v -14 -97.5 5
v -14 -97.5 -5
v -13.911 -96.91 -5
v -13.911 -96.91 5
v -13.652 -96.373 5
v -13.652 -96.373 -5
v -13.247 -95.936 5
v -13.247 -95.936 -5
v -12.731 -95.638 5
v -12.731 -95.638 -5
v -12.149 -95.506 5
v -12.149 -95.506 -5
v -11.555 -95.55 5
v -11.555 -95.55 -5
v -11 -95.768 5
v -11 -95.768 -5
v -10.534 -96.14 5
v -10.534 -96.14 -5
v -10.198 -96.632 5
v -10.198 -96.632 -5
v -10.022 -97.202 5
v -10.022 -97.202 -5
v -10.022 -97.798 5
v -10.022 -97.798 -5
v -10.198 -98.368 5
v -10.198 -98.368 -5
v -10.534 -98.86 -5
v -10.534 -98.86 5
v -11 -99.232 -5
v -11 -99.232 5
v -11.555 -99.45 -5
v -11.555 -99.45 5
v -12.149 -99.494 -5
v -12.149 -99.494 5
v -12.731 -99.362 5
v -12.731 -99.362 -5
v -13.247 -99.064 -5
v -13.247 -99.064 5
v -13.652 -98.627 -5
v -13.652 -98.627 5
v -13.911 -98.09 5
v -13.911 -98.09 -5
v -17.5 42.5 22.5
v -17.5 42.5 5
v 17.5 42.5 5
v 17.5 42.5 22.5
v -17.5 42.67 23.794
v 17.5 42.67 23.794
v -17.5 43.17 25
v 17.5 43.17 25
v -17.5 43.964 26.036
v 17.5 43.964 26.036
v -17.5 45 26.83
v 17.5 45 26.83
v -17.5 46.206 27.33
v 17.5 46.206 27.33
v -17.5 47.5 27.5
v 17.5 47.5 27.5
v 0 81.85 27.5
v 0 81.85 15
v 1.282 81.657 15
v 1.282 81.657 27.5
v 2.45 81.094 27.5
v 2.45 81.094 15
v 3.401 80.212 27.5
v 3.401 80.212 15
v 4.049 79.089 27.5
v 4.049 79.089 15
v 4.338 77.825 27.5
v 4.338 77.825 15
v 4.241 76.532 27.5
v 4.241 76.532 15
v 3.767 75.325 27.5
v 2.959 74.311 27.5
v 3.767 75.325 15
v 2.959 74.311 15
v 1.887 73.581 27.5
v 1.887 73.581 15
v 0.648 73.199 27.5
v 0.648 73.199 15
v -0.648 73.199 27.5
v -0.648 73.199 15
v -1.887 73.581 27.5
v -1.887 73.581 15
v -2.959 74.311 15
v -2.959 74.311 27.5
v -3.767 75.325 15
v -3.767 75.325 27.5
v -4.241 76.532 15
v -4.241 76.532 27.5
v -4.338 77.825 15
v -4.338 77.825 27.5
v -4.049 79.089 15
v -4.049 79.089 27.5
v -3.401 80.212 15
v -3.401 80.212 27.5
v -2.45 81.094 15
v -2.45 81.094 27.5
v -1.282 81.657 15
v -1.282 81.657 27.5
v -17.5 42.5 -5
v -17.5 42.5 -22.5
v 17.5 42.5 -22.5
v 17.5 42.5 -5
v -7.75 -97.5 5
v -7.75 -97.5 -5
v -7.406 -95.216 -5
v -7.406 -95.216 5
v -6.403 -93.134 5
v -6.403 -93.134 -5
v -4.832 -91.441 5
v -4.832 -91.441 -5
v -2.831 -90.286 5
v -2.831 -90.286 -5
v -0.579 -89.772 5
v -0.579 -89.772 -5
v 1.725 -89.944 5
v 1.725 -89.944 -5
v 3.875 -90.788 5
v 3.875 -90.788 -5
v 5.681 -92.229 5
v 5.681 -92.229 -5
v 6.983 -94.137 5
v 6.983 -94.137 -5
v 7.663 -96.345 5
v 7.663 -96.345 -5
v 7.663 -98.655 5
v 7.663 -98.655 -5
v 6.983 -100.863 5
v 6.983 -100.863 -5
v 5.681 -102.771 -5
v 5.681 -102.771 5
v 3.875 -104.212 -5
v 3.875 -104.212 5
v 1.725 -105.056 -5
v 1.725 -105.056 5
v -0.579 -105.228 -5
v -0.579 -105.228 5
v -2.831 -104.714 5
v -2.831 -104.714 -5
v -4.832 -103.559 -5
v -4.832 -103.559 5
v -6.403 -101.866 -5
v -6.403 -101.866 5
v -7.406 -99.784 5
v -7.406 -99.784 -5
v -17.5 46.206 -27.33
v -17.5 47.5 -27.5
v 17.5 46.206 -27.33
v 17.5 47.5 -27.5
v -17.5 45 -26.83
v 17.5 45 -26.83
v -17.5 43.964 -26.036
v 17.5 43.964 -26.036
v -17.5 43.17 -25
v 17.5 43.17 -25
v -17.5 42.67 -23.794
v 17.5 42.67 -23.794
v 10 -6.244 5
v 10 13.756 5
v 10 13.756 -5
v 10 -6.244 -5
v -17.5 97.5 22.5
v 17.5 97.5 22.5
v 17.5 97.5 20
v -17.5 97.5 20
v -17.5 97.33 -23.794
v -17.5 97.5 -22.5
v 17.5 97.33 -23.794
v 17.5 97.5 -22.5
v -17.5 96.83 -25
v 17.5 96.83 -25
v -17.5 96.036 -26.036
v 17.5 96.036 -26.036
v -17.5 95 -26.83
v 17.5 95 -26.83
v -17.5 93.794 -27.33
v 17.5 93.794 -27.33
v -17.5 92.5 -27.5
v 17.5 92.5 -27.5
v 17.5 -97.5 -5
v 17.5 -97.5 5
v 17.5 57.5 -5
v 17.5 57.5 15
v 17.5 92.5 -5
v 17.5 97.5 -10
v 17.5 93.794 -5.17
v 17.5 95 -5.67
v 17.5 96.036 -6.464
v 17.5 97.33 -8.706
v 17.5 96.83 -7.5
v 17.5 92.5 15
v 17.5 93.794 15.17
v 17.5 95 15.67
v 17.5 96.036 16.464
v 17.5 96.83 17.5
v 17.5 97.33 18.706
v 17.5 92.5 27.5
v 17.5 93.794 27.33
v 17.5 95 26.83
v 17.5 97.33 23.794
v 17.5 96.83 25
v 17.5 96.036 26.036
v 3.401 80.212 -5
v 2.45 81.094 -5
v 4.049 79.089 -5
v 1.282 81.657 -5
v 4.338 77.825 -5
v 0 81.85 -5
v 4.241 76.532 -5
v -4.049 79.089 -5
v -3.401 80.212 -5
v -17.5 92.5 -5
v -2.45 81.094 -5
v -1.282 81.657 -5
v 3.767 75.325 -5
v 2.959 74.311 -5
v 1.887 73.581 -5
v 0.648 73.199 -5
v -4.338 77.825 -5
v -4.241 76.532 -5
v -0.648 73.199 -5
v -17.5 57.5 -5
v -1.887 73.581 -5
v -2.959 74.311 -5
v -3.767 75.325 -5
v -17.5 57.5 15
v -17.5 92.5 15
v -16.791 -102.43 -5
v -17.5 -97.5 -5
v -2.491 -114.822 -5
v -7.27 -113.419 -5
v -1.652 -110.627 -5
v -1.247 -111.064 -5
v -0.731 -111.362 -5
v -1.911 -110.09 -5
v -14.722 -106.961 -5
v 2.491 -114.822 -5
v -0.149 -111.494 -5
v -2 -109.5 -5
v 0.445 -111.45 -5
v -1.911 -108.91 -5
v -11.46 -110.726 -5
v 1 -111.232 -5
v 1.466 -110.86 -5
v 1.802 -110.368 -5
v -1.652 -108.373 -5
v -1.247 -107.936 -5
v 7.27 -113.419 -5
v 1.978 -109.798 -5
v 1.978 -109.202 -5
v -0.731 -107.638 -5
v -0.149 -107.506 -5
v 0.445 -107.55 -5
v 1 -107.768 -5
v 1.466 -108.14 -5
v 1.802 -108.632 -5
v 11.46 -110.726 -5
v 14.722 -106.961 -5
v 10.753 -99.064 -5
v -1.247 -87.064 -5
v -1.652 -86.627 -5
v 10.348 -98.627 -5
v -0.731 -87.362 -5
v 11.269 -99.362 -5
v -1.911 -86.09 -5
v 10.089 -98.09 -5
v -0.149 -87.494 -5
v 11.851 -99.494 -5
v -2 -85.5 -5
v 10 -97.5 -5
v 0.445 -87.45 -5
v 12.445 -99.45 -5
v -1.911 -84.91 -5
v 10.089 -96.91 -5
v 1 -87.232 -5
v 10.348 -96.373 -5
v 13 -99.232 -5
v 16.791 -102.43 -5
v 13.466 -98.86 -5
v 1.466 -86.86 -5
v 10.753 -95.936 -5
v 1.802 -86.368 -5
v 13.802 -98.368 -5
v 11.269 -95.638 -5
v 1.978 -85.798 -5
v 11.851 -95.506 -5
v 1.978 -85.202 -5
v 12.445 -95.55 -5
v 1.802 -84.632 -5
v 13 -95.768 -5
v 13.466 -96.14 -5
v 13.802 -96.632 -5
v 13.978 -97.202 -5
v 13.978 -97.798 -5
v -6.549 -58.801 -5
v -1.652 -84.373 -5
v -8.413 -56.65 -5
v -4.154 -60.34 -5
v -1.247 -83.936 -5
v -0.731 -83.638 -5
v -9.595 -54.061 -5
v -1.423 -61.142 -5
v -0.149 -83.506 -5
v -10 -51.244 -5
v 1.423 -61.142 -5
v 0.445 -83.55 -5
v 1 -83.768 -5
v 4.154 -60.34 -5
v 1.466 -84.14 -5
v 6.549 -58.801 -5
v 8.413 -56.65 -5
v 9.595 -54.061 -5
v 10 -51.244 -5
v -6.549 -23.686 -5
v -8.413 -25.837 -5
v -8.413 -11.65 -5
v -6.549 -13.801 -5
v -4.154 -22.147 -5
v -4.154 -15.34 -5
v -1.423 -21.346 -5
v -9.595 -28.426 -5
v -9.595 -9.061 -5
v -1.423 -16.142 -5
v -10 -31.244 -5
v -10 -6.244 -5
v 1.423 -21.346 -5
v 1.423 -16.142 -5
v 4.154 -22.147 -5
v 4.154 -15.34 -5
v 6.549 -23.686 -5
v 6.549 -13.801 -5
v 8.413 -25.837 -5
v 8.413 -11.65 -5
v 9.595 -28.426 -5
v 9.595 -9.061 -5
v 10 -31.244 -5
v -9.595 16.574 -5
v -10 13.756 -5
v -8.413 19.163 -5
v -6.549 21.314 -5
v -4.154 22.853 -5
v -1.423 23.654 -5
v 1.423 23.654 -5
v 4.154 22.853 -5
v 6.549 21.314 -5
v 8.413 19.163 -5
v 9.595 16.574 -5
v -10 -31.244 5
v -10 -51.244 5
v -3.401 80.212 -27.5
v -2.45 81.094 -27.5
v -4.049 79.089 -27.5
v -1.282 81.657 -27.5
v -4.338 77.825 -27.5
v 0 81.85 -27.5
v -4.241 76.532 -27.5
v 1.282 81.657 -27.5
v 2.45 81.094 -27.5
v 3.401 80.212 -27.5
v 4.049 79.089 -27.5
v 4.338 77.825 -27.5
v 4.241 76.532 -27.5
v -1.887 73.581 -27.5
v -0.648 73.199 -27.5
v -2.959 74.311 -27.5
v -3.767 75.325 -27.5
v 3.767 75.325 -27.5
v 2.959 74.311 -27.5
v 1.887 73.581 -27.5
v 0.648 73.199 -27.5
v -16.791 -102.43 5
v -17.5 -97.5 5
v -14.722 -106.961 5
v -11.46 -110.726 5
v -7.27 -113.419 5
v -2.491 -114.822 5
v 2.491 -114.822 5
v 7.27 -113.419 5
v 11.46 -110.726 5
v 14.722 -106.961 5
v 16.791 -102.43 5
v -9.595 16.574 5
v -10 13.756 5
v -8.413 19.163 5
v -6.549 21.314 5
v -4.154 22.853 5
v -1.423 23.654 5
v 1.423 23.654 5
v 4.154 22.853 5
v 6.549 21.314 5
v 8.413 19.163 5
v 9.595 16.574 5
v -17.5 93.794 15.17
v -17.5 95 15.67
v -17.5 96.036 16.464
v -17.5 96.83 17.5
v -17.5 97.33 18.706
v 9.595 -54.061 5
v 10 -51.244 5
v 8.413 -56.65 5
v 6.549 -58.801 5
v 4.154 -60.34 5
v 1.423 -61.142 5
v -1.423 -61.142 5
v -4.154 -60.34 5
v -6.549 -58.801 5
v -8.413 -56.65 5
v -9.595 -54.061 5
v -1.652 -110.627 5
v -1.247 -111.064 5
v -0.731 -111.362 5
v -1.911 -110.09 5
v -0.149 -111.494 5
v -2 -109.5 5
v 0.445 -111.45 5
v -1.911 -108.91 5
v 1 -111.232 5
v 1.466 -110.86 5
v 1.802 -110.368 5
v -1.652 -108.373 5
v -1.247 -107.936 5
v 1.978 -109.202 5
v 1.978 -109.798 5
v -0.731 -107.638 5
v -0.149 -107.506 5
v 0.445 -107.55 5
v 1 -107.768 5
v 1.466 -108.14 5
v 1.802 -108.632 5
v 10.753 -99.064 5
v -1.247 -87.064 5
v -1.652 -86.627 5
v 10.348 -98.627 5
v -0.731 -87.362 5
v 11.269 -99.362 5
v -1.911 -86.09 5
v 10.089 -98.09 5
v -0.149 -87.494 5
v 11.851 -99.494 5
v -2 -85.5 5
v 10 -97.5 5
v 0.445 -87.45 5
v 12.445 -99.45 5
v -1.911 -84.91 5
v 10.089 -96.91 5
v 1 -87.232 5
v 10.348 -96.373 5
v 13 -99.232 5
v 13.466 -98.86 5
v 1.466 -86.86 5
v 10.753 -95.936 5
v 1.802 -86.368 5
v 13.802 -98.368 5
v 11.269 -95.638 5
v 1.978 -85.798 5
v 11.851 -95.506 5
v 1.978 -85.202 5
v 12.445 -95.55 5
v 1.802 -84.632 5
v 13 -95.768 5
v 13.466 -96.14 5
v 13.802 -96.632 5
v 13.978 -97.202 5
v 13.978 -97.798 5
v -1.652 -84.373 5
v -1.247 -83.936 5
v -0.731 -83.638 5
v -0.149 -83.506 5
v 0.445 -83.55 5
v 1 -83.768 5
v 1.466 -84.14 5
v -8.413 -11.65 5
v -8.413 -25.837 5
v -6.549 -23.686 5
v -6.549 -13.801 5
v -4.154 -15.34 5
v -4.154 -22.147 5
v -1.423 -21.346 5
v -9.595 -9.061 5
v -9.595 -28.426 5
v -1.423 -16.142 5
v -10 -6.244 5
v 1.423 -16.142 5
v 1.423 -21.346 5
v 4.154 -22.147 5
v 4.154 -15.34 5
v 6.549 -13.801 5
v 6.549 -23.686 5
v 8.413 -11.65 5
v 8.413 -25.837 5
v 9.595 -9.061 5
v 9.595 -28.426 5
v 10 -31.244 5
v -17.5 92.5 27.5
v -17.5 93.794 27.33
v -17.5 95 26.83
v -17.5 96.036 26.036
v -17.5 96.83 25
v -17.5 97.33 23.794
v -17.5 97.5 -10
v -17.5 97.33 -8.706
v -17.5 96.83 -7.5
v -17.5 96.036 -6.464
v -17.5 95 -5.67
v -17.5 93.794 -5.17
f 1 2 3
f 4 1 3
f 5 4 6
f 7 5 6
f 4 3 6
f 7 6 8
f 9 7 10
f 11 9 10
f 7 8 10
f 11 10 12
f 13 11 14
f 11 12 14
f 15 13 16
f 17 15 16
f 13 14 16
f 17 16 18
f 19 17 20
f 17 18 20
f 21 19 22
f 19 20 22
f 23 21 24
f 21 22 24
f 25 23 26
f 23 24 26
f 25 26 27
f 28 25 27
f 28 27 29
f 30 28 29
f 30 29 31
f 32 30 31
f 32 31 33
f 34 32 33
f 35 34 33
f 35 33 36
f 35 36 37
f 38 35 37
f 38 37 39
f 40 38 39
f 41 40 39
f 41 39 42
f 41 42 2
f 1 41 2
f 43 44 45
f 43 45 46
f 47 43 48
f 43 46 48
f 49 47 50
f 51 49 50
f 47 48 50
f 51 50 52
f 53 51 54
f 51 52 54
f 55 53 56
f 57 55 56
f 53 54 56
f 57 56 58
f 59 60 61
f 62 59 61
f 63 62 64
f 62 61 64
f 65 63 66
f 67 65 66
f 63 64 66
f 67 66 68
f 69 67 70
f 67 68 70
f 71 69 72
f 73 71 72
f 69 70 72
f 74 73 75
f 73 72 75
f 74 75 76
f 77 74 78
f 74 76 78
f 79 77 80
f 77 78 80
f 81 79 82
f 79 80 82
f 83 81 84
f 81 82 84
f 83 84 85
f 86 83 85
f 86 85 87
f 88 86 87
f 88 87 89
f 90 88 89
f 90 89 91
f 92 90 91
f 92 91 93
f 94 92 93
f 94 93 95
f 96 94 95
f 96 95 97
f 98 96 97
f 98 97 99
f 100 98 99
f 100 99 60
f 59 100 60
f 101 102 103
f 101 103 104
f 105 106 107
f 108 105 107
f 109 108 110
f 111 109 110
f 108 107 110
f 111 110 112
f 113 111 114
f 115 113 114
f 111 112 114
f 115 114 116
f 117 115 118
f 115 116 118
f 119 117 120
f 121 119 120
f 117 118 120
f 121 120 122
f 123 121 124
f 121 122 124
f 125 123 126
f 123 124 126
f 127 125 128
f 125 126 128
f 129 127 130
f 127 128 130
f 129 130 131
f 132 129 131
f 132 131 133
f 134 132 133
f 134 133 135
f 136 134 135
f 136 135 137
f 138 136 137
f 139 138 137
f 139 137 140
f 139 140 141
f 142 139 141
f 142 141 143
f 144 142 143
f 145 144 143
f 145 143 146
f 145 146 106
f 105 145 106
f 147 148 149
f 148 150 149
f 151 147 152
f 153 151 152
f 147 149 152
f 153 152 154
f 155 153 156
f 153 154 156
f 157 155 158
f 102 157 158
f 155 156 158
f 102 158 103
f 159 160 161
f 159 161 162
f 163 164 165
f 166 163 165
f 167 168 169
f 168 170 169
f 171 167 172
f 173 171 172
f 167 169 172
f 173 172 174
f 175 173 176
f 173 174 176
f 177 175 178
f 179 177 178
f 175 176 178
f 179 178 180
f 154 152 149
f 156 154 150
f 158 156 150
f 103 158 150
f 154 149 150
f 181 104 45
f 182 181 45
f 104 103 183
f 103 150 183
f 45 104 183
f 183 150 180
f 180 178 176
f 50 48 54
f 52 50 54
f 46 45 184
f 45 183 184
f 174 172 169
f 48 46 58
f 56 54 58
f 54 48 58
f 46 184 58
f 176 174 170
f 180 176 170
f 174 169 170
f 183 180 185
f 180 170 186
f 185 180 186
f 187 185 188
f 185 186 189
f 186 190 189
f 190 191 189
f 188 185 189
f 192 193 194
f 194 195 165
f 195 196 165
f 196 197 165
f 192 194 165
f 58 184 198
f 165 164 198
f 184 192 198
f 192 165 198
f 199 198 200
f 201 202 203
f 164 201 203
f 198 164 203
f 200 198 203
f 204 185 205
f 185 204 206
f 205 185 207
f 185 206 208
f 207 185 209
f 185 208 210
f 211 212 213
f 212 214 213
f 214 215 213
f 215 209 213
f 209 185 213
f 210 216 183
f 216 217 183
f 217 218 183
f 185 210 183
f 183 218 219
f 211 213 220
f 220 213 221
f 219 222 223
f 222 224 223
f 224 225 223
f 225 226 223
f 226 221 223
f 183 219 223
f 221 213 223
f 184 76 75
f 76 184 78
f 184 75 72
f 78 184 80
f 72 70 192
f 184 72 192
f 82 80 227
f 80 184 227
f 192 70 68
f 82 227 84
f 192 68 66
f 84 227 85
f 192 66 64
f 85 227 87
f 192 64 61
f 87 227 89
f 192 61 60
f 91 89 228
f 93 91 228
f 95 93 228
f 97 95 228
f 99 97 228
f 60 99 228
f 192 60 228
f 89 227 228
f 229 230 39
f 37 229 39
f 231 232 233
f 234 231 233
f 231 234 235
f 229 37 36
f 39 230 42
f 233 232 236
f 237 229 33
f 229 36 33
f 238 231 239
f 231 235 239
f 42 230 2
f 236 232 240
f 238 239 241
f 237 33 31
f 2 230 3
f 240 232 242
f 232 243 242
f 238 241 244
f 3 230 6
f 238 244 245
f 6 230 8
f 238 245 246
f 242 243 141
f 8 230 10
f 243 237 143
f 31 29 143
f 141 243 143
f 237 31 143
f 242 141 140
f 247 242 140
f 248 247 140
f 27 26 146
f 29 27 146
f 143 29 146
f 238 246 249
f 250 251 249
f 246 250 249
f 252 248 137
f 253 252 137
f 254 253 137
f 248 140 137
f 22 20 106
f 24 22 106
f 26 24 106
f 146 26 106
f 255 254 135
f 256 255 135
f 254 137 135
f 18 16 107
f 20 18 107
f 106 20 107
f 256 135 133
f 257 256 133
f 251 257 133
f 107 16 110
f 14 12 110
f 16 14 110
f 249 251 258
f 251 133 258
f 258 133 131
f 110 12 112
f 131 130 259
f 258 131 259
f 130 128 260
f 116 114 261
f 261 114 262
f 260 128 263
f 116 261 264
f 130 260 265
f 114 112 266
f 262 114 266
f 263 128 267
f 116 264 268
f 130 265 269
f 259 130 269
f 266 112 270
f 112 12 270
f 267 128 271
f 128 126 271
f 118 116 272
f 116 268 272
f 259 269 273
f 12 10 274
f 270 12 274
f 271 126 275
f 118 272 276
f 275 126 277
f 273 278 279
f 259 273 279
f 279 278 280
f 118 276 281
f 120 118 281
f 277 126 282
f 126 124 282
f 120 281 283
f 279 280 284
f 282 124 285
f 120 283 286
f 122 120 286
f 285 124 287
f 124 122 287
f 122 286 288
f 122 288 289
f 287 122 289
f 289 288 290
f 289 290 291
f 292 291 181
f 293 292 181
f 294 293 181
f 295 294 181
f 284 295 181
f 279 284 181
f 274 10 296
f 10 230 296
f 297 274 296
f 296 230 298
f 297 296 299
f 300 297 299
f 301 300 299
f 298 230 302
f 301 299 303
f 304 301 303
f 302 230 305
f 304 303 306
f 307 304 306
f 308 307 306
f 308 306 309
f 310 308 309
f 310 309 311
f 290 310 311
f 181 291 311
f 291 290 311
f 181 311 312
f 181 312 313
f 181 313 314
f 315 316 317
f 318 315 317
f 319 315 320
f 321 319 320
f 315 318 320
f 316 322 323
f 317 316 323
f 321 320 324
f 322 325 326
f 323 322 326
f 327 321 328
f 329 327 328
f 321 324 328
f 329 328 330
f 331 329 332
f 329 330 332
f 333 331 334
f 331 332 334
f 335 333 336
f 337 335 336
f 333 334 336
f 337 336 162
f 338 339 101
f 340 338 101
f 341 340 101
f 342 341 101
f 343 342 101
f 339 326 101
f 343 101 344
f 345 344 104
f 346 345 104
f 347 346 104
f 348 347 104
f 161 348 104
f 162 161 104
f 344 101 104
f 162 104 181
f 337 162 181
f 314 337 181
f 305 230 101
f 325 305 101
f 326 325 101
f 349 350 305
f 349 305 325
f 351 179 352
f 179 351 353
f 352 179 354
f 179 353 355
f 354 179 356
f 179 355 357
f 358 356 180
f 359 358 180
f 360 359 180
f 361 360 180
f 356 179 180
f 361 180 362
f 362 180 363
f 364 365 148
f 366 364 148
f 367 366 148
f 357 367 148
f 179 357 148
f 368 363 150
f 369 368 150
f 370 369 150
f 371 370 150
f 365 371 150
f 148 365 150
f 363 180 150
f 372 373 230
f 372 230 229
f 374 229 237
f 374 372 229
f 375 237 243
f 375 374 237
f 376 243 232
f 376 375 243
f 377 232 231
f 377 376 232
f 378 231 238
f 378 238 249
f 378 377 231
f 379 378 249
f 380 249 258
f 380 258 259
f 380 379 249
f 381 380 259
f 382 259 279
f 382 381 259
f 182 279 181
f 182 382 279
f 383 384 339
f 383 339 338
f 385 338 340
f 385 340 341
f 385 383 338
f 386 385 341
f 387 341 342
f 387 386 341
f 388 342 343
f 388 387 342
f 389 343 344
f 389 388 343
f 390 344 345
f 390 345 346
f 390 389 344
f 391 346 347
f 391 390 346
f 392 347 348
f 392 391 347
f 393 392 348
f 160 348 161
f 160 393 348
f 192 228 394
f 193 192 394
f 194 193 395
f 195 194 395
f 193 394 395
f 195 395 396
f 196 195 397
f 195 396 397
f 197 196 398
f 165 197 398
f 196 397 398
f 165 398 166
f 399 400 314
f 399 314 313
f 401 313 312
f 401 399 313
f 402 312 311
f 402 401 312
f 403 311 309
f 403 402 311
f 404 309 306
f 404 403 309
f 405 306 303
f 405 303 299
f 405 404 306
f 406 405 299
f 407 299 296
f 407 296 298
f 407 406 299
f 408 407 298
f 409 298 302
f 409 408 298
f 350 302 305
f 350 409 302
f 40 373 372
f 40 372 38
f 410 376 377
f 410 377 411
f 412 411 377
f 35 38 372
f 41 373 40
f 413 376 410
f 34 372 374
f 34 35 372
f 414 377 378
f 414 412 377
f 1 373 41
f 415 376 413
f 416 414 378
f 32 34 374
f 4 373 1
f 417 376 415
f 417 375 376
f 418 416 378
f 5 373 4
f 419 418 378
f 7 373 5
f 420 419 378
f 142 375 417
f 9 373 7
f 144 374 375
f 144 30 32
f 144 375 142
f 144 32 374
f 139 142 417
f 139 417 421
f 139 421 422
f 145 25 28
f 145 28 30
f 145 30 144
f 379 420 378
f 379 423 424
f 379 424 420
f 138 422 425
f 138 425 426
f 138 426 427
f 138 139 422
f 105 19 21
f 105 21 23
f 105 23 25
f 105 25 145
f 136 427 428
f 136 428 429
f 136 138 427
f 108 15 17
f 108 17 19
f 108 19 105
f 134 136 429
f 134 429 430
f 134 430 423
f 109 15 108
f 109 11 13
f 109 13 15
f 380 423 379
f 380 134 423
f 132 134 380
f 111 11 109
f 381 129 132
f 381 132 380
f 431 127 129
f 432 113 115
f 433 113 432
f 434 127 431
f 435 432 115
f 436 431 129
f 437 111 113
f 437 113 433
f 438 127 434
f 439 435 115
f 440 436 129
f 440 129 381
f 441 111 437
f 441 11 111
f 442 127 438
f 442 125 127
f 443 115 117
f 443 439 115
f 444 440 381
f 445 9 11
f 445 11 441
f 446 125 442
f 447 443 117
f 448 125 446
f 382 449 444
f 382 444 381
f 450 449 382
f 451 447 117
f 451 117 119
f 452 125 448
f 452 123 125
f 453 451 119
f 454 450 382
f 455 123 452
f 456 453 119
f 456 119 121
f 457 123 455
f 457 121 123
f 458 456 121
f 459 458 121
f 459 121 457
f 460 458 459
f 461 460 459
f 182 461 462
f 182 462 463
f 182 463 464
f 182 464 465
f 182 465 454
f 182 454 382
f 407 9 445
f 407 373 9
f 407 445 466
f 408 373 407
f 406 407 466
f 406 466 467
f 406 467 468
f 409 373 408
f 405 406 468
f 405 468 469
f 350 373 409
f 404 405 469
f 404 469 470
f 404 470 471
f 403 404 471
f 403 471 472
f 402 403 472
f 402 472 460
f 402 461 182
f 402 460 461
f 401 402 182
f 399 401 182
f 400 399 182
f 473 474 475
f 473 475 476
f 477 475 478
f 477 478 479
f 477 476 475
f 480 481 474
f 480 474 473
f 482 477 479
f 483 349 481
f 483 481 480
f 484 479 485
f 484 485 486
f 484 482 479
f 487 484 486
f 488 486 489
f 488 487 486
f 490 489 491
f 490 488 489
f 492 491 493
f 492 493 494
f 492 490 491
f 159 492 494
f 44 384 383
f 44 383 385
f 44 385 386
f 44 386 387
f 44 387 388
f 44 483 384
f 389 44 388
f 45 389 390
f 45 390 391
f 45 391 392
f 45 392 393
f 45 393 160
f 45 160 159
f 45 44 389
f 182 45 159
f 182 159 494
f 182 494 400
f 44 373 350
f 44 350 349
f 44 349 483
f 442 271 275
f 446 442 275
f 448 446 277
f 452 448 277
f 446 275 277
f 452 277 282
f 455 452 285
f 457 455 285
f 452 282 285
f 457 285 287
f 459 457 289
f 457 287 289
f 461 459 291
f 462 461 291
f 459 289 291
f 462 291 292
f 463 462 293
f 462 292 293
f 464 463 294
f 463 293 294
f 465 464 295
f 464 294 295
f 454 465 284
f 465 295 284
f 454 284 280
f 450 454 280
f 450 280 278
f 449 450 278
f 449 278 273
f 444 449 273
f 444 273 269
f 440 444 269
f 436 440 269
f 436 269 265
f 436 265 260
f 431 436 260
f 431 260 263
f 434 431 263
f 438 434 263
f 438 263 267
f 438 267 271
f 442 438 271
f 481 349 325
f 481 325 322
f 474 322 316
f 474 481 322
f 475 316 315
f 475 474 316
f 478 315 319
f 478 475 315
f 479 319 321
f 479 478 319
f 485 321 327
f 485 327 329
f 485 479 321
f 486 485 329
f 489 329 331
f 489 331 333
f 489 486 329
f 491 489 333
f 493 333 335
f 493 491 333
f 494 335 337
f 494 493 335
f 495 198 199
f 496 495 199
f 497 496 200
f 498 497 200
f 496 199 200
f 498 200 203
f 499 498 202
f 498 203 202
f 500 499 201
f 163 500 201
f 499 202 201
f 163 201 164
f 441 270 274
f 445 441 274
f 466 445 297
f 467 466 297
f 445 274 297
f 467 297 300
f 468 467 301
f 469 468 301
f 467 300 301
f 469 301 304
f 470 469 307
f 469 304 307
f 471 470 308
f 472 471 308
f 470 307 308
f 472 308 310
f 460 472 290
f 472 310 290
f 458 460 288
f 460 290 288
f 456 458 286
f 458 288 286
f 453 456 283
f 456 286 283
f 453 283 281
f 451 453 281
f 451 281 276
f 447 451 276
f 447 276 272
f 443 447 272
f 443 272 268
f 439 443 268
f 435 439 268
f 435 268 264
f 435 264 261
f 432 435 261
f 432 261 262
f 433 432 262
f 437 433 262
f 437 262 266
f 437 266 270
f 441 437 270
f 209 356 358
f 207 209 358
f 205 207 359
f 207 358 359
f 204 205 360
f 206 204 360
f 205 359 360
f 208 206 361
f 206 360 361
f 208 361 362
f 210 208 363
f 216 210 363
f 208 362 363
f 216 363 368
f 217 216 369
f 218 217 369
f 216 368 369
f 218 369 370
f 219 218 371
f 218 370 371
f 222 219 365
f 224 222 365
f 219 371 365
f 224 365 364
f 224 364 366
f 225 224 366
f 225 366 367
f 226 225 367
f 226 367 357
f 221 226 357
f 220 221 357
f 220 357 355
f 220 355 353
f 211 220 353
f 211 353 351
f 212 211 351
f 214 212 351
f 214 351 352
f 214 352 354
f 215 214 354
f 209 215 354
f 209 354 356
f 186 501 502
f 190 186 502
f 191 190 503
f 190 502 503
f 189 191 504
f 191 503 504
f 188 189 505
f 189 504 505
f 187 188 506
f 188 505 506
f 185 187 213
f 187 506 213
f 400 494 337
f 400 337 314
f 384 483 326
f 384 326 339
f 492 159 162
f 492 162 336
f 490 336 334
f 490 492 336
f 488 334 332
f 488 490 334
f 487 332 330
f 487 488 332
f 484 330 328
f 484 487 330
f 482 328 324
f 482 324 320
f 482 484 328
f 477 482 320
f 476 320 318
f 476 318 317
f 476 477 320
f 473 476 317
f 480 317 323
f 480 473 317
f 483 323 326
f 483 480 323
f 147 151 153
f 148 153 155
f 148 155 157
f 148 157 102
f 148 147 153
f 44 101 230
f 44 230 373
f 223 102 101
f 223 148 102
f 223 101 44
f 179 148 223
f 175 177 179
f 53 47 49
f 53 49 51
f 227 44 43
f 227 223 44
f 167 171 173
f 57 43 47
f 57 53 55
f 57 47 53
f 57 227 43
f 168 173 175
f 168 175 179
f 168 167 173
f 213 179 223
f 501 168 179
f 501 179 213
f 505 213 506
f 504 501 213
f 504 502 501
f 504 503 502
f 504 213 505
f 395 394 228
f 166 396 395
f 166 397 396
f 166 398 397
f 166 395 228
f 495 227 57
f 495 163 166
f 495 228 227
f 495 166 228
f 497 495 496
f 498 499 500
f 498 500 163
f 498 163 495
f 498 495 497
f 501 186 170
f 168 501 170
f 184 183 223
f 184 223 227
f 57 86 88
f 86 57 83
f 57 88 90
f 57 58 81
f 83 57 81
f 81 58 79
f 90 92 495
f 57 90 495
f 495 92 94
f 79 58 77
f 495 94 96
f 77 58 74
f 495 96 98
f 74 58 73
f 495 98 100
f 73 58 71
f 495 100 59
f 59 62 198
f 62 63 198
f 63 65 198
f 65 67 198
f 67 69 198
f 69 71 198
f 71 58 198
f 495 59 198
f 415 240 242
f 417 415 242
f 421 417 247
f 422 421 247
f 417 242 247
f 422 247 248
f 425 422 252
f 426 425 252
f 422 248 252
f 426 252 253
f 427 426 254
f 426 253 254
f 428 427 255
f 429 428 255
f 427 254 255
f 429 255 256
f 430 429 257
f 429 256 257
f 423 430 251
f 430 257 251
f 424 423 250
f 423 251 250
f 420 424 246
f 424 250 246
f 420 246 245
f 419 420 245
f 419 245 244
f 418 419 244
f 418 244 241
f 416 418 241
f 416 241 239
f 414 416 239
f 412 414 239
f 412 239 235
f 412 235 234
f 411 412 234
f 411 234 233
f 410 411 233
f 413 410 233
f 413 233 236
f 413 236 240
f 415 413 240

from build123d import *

# Parameters (mm, degrees)
BOSS_EXTRUDE1_DEPTH = 5
BOSS_EXTRUDE2_DEPTH = 17.5
CUT_EXTRUDE1_DEPTH  = 35
SKETCH13_R          = 4.35
CUT_EXTRUDE7_DEPTH  = 129.671092325
CUT_EXTRUDE2_DEPTH  = 10
CUT_EXTRUDE3_DEPTH  = 10
SKETCH9_R           = 7.75
SKETCH9_R_2         = 2
CUT_EXTRUDE4_DEPTH  = 121.778723292


with BuildPart() as part:
    # Sketch2 → Boss-Extrude1 (new, symmetric)
    with BuildSketch(Plane.XY):
        with BuildLine():
            Line((17.5, 97.5), (-17.5, 97.5))
            Line((-17.5, 97.5), (-17.5, -97.5))
            ThreePointArc((-17.5, -97.5), (0, -115), (17.5, -97.5))
            Line((17.5, -97.5), (17.5, 97.5))
        make_face()
    extrude(amount=BOSS_EXTRUDE1_DEPTH, both=True)

    # Sketch3 → Boss-Extrude2 (add, symmetric)
    with BuildSketch(Plane(origin=(0, 0, 0), x_dir=(0, 0, -1), z_dir=(1, 0, 0))):
        with BuildLine():
            Line((-22.5, 97.5), (22.5, 97.5))
            ThreePointArc((22.5, 97.5), (26.035533906, 96.035533906), (27.5, 92.5))
            Line((27.5, 92.5), (27.5, 47.5))
            ThreePointArc((27.5, 47.5), (26.035533906, 43.964466094), (22.5, 42.5))
            Line((22.5, 42.5), (-22.5, 42.5))
            ThreePointArc((-22.5, 42.5), (-26.035533906, 43.964466094), (-27.5, 47.5))
            Line((-27.5, 47.5), (-27.5, 92.5))
            ThreePointArc((-27.5, 92.5), (-26.035533906, 96.035533906), (-22.5, 97.5))
        make_face()
    extrude(amount=BOSS_EXTRUDE2_DEPTH, both=True)

    # Sketch4 → Cut-Extrude1 (cut)
    with BuildSketch(Plane.ZY.offset(17.5)):
        with BuildLine():
            Line((-5, 92.5), (-5, 57.5))
            Line((-5, 57.5), (15, 57.5))
            Line((15, 57.5), (15, 92.5))
            ThreePointArc((15, 92.5), (16.464466094, 96.035533906), (20, 97.5))
            Line((20, 97.5), (-10, 97.5))
            ThreePointArc((-10, 97.5), (-6.464466094, 96.035533906), (-5, 92.5))
        make_face()
    extrude(amount=-CUT_EXTRUDE1_DEPTH, mode=Mode.SUBTRACT)

    # Sketch13 → Cut-Extrude7 (cut, through all)
    with BuildSketch(Plane(origin=(0, 0, -27.5), x_dir=(-1, 0, 0), z_dir=(0, 0, -1))):
        with Locations(Location((0, 77.5, 0), (0, 0, 90))):
            Circle(SKETCH13_R)
    extrude(amount=-CUT_EXTRUDE7_DEPTH, mode=Mode.SUBTRACT)

    # Sketch5 → Cut-Extrude2 (cut)
    with BuildSketch(Plane.XY.offset(5)):
        with BuildLine():
            Line((10, 13.756181567), (10, -6.243818433))
            ThreePointArc((10, -6.243818433), (0, -16.243818433), (-10, -6.243818433))
            Line((-10, -6.243818433), (-10, 13.756181567))
            ThreePointArc((-10, 13.756181567), (0, 23.756181567), (10, 13.756181567))
        make_face()
        with BuildLine():
            Line((10, -31.243818433), (10, -51.243818433))
            ThreePointArc((10, -51.243818433), (0, -61.243818433), (-10, -51.243818433))
            Line((-10, -51.243818433), (-10, -31.243818433))
            ThreePointArc((-10, -31.243818433), (0, -21.243818433), (10, -31.243818433))
        make_face()
    cut_extrude2 = extrude(amount=-CUT_EXTRUDE2_DEPTH, mode=Mode.SUBTRACT)

    # Mirror1: Cut-Extrude2 across plane
    add(cut_extrude2.mirror(Plane.XY), mode=Mode.SUBTRACT)

    # Sketch8 → Cut-Extrude3 (cut)
    with BuildSketch(Plane.XY.offset(5)):
        with BuildLine():
            Line((5, 13.756181567), (5, -6.243818433))
            ThreePointArc((5, -6.243818433), (0, -11.243818433), (-5, -6.243818433))
            Line((-5, -6.243818433), (-5, 13.756181567))
            ThreePointArc((-5, 13.756181567), (0, 18.756181567), (5, 13.756181567))
        make_face()
        with BuildLine():
            Line((-5, -31.243818433), (-5, -51.243818433))
            ThreePointArc((-5, -51.243818433), (0, -56.243818433), (5, -51.243818433))
            Line((5, -51.243818433), (5, -31.243818433))
            ThreePointArc((5, -31.243818433), (0, -26.243818433), (-5, -31.243818433))
        make_face()
    extrude(amount=-CUT_EXTRUDE3_DEPTH, mode=Mode.SUBTRACT)

    # Sketch9 → Cut-Extrude4 (cut, through all)
    with BuildSketch(Plane(origin=(0, 0, -5), x_dir=(-1, 0, 0), z_dir=(0, 0, -1))):
        with Locations((0, -97.5)):
            Circle(SKETCH9_R)
        with Locations((12, -97.5)):
            Circle(SKETCH9_R_2)
        with Locations((0, -109.5)):
            Circle(SKETCH9_R_2)
        with Locations((-12, -97.5)):
            Circle(SKETCH9_R_2)
        with Locations((0, -85.5)):
            Circle(SKETCH9_R_2)
    extrude(amount=-CUT_EXTRUDE4_DEPTH, mode=Mode.SUBTRACT)


solid = part.part
